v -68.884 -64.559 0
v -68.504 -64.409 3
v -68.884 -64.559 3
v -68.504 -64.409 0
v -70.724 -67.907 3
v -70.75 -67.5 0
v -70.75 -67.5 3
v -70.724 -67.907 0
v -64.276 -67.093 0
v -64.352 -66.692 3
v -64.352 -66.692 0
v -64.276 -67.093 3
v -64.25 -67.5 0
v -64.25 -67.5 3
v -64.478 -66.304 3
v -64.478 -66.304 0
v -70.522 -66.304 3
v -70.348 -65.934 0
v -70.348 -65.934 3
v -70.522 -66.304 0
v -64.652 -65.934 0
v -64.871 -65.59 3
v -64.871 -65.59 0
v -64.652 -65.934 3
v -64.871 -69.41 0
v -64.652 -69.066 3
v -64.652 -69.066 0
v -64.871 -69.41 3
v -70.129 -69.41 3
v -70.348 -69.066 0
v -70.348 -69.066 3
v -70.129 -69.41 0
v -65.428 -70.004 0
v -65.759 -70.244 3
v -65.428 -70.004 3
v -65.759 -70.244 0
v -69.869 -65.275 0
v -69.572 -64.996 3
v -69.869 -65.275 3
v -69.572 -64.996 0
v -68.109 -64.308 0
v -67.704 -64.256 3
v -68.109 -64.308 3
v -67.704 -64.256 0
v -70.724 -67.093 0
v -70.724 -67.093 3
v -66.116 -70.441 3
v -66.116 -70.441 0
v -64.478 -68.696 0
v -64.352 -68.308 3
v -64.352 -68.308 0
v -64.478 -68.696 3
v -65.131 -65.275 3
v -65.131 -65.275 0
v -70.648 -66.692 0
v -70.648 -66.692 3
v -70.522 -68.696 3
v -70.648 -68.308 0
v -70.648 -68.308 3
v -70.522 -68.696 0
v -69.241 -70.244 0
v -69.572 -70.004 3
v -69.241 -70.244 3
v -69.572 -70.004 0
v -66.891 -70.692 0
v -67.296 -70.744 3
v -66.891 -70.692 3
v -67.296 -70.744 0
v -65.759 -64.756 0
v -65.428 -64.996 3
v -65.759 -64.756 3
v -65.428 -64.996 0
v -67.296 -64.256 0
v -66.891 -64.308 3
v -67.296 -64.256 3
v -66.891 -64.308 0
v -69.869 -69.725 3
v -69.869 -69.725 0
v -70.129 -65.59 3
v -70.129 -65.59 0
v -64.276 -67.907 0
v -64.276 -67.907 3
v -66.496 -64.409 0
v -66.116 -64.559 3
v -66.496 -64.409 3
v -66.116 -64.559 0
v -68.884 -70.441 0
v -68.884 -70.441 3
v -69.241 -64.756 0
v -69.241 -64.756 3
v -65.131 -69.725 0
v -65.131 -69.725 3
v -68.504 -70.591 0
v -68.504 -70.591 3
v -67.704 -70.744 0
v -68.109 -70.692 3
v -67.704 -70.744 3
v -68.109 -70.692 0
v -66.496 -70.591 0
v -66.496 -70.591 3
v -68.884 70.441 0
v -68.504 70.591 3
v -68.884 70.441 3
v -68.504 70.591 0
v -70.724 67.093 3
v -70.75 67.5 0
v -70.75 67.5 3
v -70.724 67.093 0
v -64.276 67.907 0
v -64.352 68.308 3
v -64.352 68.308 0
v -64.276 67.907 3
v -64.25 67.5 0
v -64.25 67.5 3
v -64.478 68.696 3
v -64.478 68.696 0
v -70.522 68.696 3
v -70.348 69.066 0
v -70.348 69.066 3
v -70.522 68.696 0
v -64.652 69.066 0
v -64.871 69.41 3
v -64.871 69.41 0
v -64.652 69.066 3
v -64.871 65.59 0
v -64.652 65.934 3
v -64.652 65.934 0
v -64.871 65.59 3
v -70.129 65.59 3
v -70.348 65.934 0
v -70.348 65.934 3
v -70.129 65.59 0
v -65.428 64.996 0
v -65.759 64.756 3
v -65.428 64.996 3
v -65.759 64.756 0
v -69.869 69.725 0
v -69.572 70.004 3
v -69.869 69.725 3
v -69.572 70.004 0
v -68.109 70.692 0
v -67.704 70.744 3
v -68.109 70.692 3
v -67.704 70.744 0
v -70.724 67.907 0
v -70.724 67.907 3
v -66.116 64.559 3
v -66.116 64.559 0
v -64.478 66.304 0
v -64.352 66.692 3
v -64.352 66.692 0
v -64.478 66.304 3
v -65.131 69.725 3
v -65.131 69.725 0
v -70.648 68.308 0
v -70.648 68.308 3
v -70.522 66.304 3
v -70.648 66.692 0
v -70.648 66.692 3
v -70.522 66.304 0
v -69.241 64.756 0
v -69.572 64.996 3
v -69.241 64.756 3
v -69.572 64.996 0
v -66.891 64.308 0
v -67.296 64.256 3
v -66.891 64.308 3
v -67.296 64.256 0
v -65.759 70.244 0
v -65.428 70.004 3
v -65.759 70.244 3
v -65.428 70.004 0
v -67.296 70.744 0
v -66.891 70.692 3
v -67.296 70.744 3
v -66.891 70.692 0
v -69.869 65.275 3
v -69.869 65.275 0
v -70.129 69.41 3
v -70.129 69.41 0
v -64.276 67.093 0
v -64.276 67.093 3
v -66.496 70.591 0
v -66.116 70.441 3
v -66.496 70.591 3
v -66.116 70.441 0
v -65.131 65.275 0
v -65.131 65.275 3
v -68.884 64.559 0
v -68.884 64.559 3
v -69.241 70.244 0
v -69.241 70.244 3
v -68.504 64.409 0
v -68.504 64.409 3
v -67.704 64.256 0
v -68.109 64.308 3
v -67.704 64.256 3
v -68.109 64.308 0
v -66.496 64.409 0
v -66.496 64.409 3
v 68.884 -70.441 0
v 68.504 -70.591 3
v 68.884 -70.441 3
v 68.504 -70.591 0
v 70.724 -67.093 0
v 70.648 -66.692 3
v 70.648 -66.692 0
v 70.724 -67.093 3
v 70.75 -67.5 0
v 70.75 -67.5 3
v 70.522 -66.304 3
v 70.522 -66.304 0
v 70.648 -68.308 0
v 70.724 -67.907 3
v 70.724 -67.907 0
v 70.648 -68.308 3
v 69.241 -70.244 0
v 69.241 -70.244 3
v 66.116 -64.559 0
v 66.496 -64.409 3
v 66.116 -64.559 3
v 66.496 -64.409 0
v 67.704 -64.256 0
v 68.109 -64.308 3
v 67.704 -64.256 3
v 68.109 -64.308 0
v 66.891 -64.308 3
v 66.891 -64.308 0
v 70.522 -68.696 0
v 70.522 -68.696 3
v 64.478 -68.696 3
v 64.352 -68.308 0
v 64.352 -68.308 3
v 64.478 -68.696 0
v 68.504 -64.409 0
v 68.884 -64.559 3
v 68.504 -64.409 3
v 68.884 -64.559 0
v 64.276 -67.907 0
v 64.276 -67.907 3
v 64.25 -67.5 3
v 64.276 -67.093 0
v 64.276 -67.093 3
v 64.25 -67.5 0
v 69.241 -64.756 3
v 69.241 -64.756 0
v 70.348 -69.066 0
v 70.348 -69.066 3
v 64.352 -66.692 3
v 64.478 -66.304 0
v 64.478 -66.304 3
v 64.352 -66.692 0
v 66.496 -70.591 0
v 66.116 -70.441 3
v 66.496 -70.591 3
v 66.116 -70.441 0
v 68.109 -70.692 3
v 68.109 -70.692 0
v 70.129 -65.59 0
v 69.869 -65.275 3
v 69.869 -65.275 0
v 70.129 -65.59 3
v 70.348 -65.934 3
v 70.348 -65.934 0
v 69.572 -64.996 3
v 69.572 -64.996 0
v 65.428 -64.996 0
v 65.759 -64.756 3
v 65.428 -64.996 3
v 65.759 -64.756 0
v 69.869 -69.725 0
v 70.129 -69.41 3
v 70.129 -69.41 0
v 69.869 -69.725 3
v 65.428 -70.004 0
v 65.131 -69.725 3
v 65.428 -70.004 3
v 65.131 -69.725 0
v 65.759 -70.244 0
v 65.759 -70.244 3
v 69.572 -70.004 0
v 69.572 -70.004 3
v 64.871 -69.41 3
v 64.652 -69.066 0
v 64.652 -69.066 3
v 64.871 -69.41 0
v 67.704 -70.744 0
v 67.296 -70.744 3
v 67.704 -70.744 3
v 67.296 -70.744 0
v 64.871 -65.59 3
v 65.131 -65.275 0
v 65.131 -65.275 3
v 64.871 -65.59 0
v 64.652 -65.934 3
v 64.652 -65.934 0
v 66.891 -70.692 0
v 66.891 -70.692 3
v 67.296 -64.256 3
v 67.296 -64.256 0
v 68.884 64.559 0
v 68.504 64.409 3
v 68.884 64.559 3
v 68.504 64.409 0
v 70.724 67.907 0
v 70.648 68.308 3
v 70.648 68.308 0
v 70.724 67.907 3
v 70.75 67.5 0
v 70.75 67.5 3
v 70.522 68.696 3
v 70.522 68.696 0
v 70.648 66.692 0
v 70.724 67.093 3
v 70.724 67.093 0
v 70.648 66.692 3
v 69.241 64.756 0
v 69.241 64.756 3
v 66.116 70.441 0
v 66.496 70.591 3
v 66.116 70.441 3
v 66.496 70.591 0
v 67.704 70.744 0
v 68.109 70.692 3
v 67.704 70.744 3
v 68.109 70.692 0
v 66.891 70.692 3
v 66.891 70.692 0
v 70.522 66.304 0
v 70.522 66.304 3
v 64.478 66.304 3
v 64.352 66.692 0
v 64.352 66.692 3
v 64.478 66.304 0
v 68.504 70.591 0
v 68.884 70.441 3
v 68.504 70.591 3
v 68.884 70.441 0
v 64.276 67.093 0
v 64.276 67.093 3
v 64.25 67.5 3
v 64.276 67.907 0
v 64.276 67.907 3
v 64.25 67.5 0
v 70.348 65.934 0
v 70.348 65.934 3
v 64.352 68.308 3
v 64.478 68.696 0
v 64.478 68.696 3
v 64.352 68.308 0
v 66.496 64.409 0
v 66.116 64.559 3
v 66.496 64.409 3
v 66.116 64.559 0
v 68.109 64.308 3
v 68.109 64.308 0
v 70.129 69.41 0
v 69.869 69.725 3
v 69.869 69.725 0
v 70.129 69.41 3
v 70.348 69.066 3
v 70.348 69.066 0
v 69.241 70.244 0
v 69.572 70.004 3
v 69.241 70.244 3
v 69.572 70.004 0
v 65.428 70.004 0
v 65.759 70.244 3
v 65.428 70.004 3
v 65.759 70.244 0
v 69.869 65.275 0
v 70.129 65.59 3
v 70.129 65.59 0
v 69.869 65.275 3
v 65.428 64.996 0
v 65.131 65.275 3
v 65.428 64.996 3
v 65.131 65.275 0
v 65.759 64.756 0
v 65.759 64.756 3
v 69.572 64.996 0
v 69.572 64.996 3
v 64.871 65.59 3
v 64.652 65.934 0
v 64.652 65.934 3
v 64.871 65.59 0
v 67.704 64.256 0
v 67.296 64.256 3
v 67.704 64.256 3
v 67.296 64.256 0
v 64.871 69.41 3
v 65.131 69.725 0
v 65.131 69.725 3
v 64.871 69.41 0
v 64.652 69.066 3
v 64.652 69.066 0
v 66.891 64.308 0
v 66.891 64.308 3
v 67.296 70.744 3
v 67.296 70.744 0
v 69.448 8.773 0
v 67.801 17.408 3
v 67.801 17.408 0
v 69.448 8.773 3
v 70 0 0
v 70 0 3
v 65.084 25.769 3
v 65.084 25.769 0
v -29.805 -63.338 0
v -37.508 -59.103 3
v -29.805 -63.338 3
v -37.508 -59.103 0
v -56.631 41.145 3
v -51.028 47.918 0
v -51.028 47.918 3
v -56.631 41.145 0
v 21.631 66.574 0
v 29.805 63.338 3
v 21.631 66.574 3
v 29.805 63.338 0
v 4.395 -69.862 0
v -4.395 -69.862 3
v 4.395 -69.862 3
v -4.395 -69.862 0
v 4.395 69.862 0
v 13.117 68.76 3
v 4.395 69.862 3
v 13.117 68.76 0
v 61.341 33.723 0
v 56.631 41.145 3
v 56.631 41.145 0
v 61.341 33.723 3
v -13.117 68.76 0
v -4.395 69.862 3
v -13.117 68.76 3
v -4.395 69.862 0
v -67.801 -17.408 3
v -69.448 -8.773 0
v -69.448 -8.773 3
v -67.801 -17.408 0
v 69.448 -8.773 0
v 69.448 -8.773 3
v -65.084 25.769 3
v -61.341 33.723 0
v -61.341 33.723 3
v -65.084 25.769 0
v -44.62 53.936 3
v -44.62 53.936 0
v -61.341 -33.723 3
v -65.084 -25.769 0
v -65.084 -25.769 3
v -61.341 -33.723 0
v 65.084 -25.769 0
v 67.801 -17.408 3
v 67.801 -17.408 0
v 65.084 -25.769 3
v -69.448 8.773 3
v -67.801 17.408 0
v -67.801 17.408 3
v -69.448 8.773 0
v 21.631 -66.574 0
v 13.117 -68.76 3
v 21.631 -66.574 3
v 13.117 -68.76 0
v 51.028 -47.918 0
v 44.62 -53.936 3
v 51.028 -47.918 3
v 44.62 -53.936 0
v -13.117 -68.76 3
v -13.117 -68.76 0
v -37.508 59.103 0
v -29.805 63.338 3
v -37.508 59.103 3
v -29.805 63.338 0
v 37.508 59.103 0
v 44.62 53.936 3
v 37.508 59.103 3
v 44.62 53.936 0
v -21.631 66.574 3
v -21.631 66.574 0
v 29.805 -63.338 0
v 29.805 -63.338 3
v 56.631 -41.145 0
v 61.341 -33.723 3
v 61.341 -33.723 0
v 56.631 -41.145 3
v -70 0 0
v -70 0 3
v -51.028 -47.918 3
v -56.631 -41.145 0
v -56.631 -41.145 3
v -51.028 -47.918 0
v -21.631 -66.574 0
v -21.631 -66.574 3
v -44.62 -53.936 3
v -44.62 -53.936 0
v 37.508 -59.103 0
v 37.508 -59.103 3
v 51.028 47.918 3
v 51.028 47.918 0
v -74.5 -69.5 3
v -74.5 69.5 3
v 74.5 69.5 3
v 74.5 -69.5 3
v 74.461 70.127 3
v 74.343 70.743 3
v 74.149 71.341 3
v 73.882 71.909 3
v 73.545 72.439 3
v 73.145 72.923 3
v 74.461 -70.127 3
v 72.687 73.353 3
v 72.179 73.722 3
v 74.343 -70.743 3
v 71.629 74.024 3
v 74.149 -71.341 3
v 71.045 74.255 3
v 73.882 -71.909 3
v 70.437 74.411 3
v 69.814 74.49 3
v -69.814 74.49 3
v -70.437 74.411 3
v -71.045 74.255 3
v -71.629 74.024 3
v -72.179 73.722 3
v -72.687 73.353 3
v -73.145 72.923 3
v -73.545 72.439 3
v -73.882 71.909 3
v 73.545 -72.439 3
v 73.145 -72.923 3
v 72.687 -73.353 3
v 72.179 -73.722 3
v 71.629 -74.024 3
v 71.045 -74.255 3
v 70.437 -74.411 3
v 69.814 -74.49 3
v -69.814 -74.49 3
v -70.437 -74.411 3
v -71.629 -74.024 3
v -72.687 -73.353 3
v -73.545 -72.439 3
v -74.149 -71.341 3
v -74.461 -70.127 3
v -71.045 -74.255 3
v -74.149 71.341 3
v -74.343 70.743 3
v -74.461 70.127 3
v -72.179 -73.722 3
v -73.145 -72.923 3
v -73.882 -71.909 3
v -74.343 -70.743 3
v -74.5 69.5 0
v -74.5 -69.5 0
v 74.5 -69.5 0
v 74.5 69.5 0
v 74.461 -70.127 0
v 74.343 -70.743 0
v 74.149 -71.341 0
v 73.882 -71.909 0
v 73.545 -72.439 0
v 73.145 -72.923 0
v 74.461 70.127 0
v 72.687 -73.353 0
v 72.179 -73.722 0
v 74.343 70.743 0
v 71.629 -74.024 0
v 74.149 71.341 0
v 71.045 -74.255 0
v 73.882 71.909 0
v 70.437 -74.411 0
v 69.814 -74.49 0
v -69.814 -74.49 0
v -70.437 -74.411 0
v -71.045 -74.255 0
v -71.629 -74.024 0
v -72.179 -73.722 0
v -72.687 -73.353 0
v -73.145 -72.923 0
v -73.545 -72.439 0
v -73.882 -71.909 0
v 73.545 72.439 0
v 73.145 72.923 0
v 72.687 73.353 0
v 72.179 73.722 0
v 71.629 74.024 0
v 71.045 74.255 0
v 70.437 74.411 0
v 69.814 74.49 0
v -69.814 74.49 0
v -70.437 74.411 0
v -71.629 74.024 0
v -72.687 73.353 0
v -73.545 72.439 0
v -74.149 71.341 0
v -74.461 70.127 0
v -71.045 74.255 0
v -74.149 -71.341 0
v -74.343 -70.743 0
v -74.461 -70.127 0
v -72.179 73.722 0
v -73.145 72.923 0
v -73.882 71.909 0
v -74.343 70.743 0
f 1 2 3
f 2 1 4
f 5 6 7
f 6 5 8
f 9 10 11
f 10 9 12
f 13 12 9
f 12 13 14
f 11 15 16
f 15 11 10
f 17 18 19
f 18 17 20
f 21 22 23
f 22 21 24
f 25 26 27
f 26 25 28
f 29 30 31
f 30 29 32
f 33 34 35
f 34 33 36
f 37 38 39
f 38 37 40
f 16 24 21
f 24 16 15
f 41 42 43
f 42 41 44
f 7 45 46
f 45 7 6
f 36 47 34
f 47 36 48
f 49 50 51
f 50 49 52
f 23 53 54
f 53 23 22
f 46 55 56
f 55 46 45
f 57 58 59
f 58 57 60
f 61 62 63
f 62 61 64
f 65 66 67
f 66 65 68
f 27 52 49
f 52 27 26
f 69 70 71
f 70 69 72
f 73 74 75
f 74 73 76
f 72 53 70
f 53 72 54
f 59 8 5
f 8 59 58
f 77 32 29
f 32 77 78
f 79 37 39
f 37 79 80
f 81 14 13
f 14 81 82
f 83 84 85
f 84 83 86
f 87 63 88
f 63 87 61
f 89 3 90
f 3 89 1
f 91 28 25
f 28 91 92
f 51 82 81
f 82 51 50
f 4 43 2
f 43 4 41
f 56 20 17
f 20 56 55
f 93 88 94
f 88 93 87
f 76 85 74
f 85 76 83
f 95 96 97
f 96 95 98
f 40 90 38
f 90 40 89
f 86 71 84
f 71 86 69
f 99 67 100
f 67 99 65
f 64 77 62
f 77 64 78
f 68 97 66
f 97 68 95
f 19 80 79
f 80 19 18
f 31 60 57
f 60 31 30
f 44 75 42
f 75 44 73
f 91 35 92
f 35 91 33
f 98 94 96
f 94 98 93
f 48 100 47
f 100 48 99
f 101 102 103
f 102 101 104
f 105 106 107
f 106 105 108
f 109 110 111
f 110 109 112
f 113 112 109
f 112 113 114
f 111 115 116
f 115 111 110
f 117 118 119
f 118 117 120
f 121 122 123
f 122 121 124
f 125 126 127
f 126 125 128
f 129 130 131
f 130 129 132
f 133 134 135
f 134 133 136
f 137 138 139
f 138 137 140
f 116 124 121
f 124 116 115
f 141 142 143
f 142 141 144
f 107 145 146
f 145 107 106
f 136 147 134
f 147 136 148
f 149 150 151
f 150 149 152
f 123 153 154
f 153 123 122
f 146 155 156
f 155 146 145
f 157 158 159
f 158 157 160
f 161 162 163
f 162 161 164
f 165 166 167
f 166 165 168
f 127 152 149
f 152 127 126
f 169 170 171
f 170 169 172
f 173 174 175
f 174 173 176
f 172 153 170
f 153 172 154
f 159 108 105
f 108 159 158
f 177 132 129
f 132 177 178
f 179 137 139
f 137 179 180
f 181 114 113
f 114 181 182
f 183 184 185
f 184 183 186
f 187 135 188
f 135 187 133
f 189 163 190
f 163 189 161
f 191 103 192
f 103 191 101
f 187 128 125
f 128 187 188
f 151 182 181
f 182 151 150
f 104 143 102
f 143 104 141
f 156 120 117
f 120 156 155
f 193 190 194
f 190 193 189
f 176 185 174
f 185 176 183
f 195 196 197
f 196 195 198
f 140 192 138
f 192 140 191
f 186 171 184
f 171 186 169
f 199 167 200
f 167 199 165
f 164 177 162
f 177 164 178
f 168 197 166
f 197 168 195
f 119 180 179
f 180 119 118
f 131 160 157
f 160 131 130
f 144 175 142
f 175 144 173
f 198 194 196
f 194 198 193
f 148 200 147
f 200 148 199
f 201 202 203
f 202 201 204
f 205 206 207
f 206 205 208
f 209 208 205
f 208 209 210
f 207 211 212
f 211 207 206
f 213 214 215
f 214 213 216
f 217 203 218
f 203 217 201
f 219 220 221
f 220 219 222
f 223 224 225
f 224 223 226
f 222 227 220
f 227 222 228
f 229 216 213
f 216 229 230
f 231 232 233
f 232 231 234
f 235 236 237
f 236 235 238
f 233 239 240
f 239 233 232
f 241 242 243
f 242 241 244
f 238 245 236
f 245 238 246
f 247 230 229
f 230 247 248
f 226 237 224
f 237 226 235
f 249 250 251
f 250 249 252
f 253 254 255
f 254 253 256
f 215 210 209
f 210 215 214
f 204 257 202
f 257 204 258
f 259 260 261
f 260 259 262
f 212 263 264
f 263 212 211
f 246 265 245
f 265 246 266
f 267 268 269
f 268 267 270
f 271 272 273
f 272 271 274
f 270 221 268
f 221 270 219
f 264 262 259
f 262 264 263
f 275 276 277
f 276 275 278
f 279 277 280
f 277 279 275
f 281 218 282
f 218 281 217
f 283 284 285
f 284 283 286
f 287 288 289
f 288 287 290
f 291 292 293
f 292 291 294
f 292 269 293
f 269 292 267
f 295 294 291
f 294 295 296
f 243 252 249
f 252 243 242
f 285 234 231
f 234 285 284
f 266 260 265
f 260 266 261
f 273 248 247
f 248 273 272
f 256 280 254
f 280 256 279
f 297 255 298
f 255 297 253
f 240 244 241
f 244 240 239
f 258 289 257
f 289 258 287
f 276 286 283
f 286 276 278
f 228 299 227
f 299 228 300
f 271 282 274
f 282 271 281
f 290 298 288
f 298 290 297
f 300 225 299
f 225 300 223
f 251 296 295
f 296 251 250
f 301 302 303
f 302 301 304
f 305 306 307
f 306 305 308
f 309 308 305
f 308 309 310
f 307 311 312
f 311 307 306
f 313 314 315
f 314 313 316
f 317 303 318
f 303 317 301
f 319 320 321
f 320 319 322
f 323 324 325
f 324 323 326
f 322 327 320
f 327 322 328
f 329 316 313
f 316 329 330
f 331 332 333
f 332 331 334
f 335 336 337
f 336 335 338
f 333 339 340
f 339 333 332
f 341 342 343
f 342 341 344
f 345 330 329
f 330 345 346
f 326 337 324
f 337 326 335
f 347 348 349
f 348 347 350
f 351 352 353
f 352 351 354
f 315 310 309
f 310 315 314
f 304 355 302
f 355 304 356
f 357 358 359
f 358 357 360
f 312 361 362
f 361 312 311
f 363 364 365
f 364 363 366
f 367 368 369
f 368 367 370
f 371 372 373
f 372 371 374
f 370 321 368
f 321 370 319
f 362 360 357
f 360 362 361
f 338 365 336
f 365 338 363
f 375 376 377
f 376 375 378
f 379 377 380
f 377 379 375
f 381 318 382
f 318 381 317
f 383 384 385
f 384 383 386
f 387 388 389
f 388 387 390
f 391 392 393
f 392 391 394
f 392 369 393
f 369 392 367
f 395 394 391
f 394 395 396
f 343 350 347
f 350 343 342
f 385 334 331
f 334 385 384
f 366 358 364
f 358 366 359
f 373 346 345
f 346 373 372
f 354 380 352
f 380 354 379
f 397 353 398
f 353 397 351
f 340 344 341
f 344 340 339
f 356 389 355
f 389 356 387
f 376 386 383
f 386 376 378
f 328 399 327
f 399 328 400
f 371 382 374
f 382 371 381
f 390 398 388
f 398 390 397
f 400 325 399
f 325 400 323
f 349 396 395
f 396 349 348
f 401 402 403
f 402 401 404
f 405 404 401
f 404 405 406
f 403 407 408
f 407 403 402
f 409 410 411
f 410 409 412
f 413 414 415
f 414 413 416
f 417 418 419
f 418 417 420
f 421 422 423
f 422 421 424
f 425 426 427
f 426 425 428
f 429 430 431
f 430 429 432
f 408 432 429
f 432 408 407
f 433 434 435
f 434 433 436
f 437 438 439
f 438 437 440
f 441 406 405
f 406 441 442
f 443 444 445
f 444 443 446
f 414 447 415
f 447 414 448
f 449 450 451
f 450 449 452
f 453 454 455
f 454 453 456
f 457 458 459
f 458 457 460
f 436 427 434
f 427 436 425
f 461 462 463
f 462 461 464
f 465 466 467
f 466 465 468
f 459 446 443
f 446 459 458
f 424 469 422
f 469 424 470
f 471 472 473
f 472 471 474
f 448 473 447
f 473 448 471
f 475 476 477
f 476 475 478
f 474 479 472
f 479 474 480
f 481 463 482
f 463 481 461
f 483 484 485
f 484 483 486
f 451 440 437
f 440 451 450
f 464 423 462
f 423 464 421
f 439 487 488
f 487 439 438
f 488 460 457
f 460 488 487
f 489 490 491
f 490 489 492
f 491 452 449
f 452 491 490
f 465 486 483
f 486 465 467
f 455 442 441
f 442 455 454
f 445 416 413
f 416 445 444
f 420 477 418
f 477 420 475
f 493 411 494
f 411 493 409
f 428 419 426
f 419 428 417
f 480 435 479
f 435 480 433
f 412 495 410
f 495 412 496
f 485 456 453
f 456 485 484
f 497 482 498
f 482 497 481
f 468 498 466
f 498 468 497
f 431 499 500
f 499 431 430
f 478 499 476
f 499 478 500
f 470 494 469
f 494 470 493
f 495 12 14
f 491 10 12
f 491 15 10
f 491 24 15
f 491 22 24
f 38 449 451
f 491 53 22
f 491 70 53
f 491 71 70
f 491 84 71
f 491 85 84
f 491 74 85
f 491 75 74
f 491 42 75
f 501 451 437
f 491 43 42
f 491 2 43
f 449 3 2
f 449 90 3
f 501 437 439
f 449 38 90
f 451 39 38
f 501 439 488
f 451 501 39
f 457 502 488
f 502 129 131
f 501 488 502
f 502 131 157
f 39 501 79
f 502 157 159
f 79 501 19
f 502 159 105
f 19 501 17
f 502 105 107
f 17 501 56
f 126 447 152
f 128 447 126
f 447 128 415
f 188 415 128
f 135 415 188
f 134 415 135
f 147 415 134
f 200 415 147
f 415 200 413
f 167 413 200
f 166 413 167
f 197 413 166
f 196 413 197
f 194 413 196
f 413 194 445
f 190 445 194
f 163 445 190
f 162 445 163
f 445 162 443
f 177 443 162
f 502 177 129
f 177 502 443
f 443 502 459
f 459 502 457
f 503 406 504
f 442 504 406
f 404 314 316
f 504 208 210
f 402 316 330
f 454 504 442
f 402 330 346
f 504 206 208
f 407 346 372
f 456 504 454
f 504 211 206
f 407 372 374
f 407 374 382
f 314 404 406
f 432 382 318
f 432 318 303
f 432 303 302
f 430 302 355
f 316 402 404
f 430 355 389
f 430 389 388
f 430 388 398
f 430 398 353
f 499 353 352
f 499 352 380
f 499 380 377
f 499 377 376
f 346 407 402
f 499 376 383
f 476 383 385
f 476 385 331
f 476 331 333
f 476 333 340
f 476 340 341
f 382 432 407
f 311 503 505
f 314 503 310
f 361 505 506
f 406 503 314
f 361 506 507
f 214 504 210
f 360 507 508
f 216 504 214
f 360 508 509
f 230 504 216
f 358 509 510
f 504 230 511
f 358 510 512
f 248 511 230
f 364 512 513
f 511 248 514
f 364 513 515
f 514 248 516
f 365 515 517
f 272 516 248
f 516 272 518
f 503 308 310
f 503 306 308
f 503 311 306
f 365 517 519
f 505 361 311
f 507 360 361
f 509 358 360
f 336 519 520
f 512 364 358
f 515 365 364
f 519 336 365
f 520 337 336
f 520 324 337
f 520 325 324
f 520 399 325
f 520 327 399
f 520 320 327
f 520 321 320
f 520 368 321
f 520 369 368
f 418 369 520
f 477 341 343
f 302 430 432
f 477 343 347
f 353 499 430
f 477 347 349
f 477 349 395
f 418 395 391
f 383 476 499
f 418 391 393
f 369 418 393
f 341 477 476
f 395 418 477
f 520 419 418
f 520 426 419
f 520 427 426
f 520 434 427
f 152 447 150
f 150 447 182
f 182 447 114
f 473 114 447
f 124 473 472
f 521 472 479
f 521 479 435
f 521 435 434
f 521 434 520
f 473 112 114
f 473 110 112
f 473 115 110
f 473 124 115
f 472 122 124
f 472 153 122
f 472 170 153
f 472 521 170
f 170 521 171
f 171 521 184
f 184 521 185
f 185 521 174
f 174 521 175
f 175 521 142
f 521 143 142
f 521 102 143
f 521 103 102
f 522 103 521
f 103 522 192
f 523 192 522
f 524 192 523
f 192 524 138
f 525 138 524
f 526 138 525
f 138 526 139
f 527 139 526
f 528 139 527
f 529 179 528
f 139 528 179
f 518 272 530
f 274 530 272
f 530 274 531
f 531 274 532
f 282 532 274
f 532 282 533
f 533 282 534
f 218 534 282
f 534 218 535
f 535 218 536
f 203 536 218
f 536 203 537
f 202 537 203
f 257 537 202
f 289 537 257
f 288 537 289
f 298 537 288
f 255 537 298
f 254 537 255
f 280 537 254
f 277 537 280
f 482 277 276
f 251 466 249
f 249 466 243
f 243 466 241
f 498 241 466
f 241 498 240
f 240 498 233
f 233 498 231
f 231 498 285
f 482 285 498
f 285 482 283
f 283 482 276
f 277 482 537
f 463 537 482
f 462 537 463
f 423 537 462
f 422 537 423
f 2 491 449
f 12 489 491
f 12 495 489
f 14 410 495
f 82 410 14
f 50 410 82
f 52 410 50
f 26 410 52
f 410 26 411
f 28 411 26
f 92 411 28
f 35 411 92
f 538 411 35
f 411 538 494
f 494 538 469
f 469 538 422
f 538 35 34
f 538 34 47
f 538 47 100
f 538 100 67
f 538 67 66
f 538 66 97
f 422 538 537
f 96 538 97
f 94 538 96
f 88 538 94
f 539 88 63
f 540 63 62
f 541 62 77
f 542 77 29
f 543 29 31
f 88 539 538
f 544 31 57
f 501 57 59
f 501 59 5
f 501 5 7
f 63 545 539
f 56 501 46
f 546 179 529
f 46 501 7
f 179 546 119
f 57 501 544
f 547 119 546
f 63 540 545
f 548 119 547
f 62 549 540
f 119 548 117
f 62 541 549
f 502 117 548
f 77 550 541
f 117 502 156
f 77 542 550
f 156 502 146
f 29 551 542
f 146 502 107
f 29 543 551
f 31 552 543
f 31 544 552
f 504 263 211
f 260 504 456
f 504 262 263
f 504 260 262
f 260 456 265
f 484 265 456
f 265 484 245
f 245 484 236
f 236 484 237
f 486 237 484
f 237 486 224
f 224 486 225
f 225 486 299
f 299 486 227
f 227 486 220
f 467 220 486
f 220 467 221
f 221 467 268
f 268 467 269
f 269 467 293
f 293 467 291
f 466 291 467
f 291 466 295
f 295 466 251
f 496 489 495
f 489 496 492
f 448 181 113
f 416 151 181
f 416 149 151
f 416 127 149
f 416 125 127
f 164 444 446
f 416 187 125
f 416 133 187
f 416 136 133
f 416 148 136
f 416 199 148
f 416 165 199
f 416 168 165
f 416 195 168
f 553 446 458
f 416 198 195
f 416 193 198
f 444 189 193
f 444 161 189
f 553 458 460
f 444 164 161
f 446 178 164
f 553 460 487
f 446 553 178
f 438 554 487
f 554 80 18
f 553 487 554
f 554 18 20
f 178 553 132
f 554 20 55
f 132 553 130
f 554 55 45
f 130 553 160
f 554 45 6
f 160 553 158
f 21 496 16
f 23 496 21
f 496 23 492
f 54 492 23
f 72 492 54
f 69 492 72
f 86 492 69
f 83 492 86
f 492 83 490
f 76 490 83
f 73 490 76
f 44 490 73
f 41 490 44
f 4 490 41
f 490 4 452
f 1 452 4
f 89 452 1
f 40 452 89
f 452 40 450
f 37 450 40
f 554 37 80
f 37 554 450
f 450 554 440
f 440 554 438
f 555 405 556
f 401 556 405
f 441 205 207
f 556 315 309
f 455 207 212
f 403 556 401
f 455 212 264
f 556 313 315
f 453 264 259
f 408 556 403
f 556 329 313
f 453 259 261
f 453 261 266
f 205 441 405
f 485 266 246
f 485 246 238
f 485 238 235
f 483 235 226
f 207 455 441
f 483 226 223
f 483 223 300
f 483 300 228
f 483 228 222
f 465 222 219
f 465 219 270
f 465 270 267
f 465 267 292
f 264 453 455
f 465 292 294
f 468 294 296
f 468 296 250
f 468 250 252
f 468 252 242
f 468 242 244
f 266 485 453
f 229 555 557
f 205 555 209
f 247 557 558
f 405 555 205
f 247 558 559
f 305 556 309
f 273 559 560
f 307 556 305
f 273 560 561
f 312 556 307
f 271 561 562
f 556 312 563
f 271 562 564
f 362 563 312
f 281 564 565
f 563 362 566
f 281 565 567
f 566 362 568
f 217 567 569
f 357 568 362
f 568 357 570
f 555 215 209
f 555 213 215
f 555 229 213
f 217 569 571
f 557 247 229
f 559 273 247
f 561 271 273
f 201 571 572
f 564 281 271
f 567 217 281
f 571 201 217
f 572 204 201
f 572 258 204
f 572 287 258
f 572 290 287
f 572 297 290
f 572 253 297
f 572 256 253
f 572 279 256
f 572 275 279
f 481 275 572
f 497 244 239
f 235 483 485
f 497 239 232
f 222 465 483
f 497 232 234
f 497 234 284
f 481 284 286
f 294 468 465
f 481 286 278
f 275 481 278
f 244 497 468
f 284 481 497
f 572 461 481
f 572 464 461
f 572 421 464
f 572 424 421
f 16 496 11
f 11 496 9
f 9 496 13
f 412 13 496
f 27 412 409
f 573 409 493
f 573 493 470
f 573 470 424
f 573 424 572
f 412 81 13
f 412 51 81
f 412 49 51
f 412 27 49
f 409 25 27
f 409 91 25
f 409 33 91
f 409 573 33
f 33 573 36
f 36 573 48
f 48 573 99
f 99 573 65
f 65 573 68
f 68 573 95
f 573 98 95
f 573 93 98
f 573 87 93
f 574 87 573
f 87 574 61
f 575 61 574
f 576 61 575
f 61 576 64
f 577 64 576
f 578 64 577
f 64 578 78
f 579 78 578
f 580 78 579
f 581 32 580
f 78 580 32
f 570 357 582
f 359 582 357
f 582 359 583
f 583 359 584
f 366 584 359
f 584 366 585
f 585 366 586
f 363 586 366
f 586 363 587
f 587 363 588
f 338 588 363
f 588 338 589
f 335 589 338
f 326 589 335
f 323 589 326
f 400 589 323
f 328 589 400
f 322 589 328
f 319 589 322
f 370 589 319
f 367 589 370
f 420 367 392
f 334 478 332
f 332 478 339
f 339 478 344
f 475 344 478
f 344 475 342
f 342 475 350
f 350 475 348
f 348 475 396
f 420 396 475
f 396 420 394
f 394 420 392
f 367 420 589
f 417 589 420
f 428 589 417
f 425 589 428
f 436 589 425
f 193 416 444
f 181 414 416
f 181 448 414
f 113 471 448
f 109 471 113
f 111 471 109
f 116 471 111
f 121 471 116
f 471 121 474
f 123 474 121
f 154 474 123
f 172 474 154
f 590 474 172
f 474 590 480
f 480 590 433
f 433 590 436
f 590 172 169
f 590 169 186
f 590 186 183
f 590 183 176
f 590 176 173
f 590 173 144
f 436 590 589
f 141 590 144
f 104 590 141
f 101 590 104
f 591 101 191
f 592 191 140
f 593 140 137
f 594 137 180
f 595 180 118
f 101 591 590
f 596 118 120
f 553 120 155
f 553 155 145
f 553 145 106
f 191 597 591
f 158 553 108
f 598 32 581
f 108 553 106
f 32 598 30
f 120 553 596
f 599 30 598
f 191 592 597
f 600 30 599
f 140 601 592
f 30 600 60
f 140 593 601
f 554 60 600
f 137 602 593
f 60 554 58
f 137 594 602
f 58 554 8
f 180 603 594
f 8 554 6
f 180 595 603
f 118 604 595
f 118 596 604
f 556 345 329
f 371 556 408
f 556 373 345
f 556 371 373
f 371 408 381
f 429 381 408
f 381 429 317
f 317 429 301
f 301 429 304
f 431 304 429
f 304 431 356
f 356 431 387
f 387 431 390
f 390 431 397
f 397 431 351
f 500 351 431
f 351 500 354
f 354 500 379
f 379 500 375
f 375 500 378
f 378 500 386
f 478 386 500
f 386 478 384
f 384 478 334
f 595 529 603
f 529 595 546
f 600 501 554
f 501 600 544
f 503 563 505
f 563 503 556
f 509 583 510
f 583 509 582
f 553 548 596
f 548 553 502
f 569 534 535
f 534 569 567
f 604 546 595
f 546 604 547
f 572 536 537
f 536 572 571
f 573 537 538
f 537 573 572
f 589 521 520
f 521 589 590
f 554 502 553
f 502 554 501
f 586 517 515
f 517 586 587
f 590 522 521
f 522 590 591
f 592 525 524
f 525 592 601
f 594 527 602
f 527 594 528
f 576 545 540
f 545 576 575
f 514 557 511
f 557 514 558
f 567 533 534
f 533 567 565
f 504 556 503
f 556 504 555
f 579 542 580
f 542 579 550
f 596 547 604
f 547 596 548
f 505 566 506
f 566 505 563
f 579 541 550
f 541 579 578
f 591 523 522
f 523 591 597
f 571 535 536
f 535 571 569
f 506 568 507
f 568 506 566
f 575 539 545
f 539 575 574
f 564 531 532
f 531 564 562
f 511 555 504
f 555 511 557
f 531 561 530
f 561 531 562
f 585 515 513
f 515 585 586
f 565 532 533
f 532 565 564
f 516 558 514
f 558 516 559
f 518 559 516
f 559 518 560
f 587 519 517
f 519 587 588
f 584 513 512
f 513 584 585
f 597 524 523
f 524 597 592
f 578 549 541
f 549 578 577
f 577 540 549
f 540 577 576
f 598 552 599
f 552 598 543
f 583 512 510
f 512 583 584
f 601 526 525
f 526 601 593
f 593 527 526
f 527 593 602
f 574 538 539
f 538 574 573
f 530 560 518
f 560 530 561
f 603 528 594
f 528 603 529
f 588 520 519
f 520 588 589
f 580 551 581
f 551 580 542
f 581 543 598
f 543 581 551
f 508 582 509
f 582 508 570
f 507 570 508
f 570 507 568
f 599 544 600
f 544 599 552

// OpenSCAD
$fn = 50;

difference() {
	union() {
		hull() {
			translate(v = [-69.5, 69.5, 0]) {
				cylinder(h = 3, r = 5);
			}
			translate(v = [69.5, 69.5, 0]) {
				cylinder(h = 3, r = 5);
			}
			translate(v = [-69.5, -69.5, 0]) {
				cylinder(h = 3, r = 5);
			}
			translate(v = [69.5, -69.5, 0]) {
				cylinder(h = 3, r = 5);
			}
		}
	}
	union() {
		translate(v = [-67.5, -67.5, -100.0]) {
			cylinder(h = 200, r = 3.25);
		}
		translate(v = [-67.5, 67.5, -100.0]) {
			cylinder(h = 200, r = 3.25);
		}
		translate(v = [67.5, -67.5, -100.0]) {
			cylinder(h = 200, r = 3.25);
		}
		translate(v = [67.5, 67.5, -100.0]) {
			cylinder(h = 200, r = 3.25);
		}
		translate(v = [-67.5, -67.5, -100.0]) {
			cylinder(h = 200, r = 1.8);
		}
		translate(v = [-67.5, 67.5, -100.0]) {
			cylinder(h = 200, r = 1.8);
		}
		translate(v = [67.5, -67.5, -100.0]) {
			cylinder(h = 200, r = 1.8);
		}
		translate(v = [67.5, 67.5, -100.0]) {
			cylinder(h = 200, r = 1.8);
		}
		cylinder(h = 3, r = 70.0);
	}
}
